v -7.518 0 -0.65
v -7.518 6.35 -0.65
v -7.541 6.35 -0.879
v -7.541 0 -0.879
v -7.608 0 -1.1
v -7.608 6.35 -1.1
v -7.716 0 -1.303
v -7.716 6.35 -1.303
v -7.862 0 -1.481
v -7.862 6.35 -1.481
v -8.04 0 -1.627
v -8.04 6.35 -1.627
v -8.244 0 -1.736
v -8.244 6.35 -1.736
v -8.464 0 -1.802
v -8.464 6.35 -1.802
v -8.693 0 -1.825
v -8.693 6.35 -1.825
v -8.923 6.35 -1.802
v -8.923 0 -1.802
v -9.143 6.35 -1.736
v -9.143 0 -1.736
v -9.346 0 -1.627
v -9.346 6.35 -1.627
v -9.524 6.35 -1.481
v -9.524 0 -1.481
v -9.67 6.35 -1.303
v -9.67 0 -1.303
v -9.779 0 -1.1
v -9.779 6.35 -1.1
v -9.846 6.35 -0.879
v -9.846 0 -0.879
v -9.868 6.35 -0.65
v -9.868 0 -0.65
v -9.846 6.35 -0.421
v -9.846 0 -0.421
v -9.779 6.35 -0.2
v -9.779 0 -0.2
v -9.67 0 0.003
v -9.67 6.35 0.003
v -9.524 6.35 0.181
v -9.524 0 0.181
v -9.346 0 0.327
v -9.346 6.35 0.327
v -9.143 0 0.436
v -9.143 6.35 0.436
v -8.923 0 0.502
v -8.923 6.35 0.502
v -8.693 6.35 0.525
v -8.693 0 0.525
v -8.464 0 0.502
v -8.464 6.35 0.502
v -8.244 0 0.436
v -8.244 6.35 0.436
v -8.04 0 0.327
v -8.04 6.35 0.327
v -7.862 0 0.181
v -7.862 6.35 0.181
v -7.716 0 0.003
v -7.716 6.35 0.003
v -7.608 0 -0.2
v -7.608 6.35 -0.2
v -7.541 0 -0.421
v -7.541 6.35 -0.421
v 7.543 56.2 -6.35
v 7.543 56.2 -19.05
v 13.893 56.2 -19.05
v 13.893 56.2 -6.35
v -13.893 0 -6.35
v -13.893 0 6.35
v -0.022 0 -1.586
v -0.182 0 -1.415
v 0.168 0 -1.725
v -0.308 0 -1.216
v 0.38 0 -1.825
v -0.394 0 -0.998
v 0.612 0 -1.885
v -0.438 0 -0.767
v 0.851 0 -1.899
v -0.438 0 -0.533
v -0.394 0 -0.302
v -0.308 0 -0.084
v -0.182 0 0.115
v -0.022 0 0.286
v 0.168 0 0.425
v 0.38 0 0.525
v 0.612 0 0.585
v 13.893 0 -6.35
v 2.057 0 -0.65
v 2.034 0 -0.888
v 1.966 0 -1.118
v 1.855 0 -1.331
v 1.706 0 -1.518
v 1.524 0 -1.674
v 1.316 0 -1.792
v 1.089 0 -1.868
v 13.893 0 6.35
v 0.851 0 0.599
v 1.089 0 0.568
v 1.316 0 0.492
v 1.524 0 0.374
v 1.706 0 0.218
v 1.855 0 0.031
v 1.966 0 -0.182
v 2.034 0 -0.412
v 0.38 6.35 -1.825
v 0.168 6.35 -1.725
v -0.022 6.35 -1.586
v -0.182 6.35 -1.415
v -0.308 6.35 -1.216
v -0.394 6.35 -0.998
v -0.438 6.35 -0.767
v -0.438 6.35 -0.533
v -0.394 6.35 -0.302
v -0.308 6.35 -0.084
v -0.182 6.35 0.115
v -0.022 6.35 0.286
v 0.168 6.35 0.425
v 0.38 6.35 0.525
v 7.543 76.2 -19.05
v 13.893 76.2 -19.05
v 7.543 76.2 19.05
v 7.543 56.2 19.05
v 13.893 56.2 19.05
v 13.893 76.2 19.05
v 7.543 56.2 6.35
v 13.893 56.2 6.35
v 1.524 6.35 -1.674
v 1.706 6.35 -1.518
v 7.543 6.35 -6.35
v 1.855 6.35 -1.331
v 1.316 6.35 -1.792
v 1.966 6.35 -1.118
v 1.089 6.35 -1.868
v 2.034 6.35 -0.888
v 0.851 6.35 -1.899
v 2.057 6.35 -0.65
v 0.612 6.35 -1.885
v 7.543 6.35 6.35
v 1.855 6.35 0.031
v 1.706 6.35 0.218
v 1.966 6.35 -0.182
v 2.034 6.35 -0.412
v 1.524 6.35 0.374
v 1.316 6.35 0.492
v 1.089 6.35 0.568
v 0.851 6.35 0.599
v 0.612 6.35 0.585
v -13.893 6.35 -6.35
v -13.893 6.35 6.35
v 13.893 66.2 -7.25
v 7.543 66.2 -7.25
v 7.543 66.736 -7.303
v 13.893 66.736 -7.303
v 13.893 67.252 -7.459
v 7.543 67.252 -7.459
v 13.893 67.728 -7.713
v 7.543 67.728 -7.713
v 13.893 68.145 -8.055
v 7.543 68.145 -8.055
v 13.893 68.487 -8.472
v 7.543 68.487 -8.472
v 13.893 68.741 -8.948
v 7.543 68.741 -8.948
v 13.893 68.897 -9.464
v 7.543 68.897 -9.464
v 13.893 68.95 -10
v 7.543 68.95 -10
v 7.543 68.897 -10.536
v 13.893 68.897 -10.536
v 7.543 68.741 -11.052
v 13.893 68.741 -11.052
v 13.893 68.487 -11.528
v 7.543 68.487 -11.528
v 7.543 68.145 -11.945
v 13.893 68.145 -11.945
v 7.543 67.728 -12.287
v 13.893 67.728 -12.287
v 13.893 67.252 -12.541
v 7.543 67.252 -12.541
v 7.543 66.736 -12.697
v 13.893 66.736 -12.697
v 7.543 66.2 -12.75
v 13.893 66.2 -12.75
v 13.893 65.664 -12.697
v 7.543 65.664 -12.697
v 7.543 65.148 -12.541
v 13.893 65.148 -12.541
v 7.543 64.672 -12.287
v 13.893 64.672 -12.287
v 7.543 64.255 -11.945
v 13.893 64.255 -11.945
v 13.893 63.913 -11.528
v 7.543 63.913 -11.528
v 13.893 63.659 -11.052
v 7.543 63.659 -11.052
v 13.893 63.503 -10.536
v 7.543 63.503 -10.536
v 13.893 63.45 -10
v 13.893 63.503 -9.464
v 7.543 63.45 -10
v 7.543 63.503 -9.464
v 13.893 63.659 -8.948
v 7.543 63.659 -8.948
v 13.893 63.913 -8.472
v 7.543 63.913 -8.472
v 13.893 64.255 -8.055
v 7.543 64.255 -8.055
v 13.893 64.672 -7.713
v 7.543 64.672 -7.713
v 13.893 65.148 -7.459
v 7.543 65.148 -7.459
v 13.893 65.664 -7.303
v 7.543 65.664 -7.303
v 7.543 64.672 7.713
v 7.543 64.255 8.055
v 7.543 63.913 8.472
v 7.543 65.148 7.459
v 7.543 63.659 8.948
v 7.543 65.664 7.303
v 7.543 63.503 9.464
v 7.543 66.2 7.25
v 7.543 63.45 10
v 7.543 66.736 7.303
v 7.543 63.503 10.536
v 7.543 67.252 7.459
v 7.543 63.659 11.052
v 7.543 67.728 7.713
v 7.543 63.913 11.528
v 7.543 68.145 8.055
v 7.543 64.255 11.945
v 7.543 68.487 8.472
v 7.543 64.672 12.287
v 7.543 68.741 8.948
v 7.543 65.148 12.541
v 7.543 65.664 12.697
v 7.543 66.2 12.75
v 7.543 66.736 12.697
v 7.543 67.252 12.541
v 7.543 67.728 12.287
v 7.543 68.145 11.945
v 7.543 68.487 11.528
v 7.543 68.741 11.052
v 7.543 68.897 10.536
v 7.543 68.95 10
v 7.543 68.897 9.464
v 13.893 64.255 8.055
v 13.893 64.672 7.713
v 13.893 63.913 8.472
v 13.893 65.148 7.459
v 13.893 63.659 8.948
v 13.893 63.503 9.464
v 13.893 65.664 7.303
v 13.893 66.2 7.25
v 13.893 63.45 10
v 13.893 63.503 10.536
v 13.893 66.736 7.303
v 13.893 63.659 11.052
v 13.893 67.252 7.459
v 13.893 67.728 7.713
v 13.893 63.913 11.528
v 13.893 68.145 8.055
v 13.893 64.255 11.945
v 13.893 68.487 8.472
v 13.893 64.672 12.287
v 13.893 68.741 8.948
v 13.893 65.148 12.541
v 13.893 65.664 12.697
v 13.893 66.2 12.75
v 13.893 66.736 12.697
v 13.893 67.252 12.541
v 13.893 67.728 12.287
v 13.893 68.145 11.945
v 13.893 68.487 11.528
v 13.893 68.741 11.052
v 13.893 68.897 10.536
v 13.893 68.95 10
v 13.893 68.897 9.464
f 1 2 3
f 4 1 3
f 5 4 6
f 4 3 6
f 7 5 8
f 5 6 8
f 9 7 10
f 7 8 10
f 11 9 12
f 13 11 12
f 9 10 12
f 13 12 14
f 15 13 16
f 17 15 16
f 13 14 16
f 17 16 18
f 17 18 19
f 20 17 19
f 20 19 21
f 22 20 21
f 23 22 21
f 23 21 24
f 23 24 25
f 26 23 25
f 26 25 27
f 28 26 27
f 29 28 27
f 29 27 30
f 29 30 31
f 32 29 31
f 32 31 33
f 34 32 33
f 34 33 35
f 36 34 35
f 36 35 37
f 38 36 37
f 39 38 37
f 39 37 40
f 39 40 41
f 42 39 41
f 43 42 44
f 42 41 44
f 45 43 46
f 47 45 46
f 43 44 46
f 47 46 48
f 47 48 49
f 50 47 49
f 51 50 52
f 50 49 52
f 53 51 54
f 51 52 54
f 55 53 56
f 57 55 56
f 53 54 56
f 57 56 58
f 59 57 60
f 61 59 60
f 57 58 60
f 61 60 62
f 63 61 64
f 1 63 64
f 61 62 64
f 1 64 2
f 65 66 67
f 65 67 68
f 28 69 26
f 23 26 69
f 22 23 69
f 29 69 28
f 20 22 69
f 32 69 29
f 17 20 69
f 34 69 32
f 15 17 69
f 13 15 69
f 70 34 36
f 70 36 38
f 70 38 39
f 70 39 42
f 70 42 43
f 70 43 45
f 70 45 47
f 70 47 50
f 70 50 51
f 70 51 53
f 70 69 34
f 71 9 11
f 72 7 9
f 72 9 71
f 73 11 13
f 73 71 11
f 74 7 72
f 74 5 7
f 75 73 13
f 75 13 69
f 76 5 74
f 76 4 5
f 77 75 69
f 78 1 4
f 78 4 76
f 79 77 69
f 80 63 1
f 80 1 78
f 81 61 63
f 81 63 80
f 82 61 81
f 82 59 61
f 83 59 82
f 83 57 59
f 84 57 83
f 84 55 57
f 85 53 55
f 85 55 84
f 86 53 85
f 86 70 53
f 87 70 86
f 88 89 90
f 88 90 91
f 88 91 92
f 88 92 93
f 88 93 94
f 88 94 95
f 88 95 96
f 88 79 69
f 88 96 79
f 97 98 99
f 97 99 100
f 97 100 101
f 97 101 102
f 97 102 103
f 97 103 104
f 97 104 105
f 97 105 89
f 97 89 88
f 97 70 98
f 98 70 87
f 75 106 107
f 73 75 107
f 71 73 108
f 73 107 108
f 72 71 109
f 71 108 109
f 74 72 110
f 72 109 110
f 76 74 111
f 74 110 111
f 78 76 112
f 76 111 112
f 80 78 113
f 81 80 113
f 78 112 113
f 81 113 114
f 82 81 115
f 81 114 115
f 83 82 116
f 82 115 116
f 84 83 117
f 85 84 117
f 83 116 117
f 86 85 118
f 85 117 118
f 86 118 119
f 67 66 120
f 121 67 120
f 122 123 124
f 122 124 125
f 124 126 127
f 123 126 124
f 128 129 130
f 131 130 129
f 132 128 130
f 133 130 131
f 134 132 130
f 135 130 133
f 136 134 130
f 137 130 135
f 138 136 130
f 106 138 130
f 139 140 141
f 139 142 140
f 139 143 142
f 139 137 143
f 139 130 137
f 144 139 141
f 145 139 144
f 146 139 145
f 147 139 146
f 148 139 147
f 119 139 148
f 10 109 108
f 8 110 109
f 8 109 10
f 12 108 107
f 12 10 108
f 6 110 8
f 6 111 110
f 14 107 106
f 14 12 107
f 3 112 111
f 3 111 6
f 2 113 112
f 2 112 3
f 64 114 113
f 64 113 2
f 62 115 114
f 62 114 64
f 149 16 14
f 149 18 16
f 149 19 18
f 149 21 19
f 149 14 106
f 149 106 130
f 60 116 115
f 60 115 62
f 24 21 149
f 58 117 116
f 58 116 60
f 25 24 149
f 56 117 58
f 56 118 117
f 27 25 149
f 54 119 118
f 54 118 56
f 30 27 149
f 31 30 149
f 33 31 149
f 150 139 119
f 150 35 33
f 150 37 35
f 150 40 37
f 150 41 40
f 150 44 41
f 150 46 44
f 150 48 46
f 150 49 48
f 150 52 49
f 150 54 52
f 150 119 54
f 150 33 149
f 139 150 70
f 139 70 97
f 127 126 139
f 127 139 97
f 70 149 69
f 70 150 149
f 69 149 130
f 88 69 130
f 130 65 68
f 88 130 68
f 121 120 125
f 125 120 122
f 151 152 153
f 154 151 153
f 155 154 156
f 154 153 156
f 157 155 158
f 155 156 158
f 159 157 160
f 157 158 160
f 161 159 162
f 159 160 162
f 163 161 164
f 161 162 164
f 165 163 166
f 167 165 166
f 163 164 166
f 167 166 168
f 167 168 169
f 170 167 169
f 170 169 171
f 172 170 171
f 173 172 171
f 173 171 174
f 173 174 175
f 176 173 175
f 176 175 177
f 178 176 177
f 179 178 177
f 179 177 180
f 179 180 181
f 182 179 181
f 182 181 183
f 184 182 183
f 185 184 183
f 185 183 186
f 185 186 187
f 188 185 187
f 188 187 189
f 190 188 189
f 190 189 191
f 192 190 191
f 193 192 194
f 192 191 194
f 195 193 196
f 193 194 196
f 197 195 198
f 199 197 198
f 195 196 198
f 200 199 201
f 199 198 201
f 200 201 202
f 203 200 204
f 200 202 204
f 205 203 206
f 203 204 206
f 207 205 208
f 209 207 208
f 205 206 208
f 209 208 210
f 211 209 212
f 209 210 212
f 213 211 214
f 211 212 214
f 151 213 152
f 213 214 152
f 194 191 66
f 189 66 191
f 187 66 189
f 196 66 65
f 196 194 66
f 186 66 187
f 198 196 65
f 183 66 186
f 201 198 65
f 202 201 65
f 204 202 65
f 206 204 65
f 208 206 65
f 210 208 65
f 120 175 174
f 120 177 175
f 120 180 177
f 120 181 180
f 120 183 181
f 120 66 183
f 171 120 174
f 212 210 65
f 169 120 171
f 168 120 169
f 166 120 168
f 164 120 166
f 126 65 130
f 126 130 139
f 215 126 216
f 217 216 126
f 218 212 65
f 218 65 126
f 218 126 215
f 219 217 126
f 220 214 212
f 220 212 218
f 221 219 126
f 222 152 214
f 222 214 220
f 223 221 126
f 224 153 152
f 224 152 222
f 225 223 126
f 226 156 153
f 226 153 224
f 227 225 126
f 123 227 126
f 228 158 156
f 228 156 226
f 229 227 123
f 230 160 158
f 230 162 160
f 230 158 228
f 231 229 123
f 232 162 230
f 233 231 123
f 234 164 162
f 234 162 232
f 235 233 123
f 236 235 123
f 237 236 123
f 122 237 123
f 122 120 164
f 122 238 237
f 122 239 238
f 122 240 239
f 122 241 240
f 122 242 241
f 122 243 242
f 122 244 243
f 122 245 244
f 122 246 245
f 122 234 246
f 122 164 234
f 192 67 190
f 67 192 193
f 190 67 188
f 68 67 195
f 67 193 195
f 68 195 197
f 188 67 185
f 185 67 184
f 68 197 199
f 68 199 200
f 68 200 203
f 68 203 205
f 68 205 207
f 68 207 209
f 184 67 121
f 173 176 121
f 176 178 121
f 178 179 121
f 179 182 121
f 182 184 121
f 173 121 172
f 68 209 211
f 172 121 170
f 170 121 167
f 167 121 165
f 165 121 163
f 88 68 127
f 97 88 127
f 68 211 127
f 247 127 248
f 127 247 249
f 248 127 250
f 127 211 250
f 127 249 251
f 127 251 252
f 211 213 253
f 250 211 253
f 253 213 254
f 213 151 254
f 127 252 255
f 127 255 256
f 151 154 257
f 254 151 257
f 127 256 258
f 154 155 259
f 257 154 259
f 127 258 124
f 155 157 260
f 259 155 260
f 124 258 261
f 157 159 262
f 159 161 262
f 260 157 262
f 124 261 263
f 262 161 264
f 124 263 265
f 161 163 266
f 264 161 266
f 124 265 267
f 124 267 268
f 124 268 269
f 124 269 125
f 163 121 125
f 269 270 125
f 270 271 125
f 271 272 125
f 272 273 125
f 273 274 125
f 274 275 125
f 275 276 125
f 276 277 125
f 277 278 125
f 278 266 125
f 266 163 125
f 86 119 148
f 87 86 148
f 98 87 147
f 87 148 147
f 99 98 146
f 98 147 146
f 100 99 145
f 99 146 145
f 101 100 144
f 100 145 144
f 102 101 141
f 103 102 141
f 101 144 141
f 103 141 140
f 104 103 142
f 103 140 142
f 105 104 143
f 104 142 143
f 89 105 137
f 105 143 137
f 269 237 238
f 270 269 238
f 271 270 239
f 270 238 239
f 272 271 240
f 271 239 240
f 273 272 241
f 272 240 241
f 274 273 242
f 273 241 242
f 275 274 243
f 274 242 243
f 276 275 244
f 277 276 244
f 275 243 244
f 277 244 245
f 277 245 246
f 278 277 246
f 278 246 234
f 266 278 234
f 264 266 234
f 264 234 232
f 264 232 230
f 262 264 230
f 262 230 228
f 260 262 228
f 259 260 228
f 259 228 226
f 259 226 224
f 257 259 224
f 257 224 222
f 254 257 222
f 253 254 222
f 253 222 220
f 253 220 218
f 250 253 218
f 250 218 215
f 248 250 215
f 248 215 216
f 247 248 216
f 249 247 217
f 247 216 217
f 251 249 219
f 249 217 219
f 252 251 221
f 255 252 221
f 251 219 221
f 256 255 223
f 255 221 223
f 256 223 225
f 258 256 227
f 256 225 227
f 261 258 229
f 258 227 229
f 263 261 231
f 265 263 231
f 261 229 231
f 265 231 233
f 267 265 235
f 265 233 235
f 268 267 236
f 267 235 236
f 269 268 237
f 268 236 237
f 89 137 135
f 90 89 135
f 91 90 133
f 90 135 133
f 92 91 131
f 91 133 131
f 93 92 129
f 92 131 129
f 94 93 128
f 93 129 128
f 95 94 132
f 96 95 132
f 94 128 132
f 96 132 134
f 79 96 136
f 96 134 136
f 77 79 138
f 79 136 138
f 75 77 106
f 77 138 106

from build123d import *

# Parameters (mm, degrees)
BOSS_EXTRUDE1_DEPTH = 6.35
SKETCH2_W           = 38.1
SKETCH2_H           = 20
BOSS_EXTRUDE2_DEPTH = 6.35
SKETCH3_R           = 1.175
CUT_EXTRUDE1_DEPTH  = 7.35
SKETCH4_R           = 2.75
CUT_EXTRUDE2_DEPTH  = 7.35


with BuildPart() as part:
    # Sketch1 → Boss-Extrude1 (new body, symmetric)
    with BuildSketch(Plane.XY):
        Polygon((-13.893293336, 0), (13.893293336, 0), (13.893293336, 76.2), (7.543293336, 76.2), (7.543293336, 6.35), (-13.893293336, 6.35), align=None)
    extrude(amount=BOSS_EXTRUDE1_DEPTH, both=True)

    # Sketch2 → Boss-Extrude2 (add)
    with BuildSketch(Plane.ZY.offset(-7.543293336)):
        with Locations((0, 66.2)):
            Rectangle(SKETCH2_W, SKETCH2_H)
    extrude(amount=-BOSS_EXTRUDE2_DEPTH)

    # Sketch3 → Cut-Extrude1 (cut, through all)
    with BuildSketch(Plane(origin=(0, 6.35, 0), x_dir=(1, 0, 0), z_dir=(0, 1, 0))):
        with BuildLine():
            ThreePointArc((2.056706664, 0.65), (1.524137822, 1.673617376), (0.380238611, 1.825))
            ThreePointArc((0.380238611, 1.825), (-0.443293336, 0.65), (0.380238611, -0.525))
            ThreePointArc((0.380238611, -0.525), (1.524137822, -0.373617376), (2.056706664, 0.65))
        make_face()
        with Locations((-8.693293336, 0.65)):
            Circle(SKETCH3_R)
    extrude(amount=-CUT_EXTRUDE1_DEPTH, mode=Mode.SUBTRACT)

    # Sketch4 → Cut-Extrude2 (cut, through all)
    with BuildSketch(Plane.ZY.offset(-7.543293336)):
        with Locations((-10, 66.2)):
            Circle(SKETCH4_R)
        with Locations((10, 66.2)):
            Circle(SKETCH4_R)
    extrude(amount=-CUT_EXTRUDE2_DEPTH, mode=Mode.SUBTRACT)


solid = part.part
